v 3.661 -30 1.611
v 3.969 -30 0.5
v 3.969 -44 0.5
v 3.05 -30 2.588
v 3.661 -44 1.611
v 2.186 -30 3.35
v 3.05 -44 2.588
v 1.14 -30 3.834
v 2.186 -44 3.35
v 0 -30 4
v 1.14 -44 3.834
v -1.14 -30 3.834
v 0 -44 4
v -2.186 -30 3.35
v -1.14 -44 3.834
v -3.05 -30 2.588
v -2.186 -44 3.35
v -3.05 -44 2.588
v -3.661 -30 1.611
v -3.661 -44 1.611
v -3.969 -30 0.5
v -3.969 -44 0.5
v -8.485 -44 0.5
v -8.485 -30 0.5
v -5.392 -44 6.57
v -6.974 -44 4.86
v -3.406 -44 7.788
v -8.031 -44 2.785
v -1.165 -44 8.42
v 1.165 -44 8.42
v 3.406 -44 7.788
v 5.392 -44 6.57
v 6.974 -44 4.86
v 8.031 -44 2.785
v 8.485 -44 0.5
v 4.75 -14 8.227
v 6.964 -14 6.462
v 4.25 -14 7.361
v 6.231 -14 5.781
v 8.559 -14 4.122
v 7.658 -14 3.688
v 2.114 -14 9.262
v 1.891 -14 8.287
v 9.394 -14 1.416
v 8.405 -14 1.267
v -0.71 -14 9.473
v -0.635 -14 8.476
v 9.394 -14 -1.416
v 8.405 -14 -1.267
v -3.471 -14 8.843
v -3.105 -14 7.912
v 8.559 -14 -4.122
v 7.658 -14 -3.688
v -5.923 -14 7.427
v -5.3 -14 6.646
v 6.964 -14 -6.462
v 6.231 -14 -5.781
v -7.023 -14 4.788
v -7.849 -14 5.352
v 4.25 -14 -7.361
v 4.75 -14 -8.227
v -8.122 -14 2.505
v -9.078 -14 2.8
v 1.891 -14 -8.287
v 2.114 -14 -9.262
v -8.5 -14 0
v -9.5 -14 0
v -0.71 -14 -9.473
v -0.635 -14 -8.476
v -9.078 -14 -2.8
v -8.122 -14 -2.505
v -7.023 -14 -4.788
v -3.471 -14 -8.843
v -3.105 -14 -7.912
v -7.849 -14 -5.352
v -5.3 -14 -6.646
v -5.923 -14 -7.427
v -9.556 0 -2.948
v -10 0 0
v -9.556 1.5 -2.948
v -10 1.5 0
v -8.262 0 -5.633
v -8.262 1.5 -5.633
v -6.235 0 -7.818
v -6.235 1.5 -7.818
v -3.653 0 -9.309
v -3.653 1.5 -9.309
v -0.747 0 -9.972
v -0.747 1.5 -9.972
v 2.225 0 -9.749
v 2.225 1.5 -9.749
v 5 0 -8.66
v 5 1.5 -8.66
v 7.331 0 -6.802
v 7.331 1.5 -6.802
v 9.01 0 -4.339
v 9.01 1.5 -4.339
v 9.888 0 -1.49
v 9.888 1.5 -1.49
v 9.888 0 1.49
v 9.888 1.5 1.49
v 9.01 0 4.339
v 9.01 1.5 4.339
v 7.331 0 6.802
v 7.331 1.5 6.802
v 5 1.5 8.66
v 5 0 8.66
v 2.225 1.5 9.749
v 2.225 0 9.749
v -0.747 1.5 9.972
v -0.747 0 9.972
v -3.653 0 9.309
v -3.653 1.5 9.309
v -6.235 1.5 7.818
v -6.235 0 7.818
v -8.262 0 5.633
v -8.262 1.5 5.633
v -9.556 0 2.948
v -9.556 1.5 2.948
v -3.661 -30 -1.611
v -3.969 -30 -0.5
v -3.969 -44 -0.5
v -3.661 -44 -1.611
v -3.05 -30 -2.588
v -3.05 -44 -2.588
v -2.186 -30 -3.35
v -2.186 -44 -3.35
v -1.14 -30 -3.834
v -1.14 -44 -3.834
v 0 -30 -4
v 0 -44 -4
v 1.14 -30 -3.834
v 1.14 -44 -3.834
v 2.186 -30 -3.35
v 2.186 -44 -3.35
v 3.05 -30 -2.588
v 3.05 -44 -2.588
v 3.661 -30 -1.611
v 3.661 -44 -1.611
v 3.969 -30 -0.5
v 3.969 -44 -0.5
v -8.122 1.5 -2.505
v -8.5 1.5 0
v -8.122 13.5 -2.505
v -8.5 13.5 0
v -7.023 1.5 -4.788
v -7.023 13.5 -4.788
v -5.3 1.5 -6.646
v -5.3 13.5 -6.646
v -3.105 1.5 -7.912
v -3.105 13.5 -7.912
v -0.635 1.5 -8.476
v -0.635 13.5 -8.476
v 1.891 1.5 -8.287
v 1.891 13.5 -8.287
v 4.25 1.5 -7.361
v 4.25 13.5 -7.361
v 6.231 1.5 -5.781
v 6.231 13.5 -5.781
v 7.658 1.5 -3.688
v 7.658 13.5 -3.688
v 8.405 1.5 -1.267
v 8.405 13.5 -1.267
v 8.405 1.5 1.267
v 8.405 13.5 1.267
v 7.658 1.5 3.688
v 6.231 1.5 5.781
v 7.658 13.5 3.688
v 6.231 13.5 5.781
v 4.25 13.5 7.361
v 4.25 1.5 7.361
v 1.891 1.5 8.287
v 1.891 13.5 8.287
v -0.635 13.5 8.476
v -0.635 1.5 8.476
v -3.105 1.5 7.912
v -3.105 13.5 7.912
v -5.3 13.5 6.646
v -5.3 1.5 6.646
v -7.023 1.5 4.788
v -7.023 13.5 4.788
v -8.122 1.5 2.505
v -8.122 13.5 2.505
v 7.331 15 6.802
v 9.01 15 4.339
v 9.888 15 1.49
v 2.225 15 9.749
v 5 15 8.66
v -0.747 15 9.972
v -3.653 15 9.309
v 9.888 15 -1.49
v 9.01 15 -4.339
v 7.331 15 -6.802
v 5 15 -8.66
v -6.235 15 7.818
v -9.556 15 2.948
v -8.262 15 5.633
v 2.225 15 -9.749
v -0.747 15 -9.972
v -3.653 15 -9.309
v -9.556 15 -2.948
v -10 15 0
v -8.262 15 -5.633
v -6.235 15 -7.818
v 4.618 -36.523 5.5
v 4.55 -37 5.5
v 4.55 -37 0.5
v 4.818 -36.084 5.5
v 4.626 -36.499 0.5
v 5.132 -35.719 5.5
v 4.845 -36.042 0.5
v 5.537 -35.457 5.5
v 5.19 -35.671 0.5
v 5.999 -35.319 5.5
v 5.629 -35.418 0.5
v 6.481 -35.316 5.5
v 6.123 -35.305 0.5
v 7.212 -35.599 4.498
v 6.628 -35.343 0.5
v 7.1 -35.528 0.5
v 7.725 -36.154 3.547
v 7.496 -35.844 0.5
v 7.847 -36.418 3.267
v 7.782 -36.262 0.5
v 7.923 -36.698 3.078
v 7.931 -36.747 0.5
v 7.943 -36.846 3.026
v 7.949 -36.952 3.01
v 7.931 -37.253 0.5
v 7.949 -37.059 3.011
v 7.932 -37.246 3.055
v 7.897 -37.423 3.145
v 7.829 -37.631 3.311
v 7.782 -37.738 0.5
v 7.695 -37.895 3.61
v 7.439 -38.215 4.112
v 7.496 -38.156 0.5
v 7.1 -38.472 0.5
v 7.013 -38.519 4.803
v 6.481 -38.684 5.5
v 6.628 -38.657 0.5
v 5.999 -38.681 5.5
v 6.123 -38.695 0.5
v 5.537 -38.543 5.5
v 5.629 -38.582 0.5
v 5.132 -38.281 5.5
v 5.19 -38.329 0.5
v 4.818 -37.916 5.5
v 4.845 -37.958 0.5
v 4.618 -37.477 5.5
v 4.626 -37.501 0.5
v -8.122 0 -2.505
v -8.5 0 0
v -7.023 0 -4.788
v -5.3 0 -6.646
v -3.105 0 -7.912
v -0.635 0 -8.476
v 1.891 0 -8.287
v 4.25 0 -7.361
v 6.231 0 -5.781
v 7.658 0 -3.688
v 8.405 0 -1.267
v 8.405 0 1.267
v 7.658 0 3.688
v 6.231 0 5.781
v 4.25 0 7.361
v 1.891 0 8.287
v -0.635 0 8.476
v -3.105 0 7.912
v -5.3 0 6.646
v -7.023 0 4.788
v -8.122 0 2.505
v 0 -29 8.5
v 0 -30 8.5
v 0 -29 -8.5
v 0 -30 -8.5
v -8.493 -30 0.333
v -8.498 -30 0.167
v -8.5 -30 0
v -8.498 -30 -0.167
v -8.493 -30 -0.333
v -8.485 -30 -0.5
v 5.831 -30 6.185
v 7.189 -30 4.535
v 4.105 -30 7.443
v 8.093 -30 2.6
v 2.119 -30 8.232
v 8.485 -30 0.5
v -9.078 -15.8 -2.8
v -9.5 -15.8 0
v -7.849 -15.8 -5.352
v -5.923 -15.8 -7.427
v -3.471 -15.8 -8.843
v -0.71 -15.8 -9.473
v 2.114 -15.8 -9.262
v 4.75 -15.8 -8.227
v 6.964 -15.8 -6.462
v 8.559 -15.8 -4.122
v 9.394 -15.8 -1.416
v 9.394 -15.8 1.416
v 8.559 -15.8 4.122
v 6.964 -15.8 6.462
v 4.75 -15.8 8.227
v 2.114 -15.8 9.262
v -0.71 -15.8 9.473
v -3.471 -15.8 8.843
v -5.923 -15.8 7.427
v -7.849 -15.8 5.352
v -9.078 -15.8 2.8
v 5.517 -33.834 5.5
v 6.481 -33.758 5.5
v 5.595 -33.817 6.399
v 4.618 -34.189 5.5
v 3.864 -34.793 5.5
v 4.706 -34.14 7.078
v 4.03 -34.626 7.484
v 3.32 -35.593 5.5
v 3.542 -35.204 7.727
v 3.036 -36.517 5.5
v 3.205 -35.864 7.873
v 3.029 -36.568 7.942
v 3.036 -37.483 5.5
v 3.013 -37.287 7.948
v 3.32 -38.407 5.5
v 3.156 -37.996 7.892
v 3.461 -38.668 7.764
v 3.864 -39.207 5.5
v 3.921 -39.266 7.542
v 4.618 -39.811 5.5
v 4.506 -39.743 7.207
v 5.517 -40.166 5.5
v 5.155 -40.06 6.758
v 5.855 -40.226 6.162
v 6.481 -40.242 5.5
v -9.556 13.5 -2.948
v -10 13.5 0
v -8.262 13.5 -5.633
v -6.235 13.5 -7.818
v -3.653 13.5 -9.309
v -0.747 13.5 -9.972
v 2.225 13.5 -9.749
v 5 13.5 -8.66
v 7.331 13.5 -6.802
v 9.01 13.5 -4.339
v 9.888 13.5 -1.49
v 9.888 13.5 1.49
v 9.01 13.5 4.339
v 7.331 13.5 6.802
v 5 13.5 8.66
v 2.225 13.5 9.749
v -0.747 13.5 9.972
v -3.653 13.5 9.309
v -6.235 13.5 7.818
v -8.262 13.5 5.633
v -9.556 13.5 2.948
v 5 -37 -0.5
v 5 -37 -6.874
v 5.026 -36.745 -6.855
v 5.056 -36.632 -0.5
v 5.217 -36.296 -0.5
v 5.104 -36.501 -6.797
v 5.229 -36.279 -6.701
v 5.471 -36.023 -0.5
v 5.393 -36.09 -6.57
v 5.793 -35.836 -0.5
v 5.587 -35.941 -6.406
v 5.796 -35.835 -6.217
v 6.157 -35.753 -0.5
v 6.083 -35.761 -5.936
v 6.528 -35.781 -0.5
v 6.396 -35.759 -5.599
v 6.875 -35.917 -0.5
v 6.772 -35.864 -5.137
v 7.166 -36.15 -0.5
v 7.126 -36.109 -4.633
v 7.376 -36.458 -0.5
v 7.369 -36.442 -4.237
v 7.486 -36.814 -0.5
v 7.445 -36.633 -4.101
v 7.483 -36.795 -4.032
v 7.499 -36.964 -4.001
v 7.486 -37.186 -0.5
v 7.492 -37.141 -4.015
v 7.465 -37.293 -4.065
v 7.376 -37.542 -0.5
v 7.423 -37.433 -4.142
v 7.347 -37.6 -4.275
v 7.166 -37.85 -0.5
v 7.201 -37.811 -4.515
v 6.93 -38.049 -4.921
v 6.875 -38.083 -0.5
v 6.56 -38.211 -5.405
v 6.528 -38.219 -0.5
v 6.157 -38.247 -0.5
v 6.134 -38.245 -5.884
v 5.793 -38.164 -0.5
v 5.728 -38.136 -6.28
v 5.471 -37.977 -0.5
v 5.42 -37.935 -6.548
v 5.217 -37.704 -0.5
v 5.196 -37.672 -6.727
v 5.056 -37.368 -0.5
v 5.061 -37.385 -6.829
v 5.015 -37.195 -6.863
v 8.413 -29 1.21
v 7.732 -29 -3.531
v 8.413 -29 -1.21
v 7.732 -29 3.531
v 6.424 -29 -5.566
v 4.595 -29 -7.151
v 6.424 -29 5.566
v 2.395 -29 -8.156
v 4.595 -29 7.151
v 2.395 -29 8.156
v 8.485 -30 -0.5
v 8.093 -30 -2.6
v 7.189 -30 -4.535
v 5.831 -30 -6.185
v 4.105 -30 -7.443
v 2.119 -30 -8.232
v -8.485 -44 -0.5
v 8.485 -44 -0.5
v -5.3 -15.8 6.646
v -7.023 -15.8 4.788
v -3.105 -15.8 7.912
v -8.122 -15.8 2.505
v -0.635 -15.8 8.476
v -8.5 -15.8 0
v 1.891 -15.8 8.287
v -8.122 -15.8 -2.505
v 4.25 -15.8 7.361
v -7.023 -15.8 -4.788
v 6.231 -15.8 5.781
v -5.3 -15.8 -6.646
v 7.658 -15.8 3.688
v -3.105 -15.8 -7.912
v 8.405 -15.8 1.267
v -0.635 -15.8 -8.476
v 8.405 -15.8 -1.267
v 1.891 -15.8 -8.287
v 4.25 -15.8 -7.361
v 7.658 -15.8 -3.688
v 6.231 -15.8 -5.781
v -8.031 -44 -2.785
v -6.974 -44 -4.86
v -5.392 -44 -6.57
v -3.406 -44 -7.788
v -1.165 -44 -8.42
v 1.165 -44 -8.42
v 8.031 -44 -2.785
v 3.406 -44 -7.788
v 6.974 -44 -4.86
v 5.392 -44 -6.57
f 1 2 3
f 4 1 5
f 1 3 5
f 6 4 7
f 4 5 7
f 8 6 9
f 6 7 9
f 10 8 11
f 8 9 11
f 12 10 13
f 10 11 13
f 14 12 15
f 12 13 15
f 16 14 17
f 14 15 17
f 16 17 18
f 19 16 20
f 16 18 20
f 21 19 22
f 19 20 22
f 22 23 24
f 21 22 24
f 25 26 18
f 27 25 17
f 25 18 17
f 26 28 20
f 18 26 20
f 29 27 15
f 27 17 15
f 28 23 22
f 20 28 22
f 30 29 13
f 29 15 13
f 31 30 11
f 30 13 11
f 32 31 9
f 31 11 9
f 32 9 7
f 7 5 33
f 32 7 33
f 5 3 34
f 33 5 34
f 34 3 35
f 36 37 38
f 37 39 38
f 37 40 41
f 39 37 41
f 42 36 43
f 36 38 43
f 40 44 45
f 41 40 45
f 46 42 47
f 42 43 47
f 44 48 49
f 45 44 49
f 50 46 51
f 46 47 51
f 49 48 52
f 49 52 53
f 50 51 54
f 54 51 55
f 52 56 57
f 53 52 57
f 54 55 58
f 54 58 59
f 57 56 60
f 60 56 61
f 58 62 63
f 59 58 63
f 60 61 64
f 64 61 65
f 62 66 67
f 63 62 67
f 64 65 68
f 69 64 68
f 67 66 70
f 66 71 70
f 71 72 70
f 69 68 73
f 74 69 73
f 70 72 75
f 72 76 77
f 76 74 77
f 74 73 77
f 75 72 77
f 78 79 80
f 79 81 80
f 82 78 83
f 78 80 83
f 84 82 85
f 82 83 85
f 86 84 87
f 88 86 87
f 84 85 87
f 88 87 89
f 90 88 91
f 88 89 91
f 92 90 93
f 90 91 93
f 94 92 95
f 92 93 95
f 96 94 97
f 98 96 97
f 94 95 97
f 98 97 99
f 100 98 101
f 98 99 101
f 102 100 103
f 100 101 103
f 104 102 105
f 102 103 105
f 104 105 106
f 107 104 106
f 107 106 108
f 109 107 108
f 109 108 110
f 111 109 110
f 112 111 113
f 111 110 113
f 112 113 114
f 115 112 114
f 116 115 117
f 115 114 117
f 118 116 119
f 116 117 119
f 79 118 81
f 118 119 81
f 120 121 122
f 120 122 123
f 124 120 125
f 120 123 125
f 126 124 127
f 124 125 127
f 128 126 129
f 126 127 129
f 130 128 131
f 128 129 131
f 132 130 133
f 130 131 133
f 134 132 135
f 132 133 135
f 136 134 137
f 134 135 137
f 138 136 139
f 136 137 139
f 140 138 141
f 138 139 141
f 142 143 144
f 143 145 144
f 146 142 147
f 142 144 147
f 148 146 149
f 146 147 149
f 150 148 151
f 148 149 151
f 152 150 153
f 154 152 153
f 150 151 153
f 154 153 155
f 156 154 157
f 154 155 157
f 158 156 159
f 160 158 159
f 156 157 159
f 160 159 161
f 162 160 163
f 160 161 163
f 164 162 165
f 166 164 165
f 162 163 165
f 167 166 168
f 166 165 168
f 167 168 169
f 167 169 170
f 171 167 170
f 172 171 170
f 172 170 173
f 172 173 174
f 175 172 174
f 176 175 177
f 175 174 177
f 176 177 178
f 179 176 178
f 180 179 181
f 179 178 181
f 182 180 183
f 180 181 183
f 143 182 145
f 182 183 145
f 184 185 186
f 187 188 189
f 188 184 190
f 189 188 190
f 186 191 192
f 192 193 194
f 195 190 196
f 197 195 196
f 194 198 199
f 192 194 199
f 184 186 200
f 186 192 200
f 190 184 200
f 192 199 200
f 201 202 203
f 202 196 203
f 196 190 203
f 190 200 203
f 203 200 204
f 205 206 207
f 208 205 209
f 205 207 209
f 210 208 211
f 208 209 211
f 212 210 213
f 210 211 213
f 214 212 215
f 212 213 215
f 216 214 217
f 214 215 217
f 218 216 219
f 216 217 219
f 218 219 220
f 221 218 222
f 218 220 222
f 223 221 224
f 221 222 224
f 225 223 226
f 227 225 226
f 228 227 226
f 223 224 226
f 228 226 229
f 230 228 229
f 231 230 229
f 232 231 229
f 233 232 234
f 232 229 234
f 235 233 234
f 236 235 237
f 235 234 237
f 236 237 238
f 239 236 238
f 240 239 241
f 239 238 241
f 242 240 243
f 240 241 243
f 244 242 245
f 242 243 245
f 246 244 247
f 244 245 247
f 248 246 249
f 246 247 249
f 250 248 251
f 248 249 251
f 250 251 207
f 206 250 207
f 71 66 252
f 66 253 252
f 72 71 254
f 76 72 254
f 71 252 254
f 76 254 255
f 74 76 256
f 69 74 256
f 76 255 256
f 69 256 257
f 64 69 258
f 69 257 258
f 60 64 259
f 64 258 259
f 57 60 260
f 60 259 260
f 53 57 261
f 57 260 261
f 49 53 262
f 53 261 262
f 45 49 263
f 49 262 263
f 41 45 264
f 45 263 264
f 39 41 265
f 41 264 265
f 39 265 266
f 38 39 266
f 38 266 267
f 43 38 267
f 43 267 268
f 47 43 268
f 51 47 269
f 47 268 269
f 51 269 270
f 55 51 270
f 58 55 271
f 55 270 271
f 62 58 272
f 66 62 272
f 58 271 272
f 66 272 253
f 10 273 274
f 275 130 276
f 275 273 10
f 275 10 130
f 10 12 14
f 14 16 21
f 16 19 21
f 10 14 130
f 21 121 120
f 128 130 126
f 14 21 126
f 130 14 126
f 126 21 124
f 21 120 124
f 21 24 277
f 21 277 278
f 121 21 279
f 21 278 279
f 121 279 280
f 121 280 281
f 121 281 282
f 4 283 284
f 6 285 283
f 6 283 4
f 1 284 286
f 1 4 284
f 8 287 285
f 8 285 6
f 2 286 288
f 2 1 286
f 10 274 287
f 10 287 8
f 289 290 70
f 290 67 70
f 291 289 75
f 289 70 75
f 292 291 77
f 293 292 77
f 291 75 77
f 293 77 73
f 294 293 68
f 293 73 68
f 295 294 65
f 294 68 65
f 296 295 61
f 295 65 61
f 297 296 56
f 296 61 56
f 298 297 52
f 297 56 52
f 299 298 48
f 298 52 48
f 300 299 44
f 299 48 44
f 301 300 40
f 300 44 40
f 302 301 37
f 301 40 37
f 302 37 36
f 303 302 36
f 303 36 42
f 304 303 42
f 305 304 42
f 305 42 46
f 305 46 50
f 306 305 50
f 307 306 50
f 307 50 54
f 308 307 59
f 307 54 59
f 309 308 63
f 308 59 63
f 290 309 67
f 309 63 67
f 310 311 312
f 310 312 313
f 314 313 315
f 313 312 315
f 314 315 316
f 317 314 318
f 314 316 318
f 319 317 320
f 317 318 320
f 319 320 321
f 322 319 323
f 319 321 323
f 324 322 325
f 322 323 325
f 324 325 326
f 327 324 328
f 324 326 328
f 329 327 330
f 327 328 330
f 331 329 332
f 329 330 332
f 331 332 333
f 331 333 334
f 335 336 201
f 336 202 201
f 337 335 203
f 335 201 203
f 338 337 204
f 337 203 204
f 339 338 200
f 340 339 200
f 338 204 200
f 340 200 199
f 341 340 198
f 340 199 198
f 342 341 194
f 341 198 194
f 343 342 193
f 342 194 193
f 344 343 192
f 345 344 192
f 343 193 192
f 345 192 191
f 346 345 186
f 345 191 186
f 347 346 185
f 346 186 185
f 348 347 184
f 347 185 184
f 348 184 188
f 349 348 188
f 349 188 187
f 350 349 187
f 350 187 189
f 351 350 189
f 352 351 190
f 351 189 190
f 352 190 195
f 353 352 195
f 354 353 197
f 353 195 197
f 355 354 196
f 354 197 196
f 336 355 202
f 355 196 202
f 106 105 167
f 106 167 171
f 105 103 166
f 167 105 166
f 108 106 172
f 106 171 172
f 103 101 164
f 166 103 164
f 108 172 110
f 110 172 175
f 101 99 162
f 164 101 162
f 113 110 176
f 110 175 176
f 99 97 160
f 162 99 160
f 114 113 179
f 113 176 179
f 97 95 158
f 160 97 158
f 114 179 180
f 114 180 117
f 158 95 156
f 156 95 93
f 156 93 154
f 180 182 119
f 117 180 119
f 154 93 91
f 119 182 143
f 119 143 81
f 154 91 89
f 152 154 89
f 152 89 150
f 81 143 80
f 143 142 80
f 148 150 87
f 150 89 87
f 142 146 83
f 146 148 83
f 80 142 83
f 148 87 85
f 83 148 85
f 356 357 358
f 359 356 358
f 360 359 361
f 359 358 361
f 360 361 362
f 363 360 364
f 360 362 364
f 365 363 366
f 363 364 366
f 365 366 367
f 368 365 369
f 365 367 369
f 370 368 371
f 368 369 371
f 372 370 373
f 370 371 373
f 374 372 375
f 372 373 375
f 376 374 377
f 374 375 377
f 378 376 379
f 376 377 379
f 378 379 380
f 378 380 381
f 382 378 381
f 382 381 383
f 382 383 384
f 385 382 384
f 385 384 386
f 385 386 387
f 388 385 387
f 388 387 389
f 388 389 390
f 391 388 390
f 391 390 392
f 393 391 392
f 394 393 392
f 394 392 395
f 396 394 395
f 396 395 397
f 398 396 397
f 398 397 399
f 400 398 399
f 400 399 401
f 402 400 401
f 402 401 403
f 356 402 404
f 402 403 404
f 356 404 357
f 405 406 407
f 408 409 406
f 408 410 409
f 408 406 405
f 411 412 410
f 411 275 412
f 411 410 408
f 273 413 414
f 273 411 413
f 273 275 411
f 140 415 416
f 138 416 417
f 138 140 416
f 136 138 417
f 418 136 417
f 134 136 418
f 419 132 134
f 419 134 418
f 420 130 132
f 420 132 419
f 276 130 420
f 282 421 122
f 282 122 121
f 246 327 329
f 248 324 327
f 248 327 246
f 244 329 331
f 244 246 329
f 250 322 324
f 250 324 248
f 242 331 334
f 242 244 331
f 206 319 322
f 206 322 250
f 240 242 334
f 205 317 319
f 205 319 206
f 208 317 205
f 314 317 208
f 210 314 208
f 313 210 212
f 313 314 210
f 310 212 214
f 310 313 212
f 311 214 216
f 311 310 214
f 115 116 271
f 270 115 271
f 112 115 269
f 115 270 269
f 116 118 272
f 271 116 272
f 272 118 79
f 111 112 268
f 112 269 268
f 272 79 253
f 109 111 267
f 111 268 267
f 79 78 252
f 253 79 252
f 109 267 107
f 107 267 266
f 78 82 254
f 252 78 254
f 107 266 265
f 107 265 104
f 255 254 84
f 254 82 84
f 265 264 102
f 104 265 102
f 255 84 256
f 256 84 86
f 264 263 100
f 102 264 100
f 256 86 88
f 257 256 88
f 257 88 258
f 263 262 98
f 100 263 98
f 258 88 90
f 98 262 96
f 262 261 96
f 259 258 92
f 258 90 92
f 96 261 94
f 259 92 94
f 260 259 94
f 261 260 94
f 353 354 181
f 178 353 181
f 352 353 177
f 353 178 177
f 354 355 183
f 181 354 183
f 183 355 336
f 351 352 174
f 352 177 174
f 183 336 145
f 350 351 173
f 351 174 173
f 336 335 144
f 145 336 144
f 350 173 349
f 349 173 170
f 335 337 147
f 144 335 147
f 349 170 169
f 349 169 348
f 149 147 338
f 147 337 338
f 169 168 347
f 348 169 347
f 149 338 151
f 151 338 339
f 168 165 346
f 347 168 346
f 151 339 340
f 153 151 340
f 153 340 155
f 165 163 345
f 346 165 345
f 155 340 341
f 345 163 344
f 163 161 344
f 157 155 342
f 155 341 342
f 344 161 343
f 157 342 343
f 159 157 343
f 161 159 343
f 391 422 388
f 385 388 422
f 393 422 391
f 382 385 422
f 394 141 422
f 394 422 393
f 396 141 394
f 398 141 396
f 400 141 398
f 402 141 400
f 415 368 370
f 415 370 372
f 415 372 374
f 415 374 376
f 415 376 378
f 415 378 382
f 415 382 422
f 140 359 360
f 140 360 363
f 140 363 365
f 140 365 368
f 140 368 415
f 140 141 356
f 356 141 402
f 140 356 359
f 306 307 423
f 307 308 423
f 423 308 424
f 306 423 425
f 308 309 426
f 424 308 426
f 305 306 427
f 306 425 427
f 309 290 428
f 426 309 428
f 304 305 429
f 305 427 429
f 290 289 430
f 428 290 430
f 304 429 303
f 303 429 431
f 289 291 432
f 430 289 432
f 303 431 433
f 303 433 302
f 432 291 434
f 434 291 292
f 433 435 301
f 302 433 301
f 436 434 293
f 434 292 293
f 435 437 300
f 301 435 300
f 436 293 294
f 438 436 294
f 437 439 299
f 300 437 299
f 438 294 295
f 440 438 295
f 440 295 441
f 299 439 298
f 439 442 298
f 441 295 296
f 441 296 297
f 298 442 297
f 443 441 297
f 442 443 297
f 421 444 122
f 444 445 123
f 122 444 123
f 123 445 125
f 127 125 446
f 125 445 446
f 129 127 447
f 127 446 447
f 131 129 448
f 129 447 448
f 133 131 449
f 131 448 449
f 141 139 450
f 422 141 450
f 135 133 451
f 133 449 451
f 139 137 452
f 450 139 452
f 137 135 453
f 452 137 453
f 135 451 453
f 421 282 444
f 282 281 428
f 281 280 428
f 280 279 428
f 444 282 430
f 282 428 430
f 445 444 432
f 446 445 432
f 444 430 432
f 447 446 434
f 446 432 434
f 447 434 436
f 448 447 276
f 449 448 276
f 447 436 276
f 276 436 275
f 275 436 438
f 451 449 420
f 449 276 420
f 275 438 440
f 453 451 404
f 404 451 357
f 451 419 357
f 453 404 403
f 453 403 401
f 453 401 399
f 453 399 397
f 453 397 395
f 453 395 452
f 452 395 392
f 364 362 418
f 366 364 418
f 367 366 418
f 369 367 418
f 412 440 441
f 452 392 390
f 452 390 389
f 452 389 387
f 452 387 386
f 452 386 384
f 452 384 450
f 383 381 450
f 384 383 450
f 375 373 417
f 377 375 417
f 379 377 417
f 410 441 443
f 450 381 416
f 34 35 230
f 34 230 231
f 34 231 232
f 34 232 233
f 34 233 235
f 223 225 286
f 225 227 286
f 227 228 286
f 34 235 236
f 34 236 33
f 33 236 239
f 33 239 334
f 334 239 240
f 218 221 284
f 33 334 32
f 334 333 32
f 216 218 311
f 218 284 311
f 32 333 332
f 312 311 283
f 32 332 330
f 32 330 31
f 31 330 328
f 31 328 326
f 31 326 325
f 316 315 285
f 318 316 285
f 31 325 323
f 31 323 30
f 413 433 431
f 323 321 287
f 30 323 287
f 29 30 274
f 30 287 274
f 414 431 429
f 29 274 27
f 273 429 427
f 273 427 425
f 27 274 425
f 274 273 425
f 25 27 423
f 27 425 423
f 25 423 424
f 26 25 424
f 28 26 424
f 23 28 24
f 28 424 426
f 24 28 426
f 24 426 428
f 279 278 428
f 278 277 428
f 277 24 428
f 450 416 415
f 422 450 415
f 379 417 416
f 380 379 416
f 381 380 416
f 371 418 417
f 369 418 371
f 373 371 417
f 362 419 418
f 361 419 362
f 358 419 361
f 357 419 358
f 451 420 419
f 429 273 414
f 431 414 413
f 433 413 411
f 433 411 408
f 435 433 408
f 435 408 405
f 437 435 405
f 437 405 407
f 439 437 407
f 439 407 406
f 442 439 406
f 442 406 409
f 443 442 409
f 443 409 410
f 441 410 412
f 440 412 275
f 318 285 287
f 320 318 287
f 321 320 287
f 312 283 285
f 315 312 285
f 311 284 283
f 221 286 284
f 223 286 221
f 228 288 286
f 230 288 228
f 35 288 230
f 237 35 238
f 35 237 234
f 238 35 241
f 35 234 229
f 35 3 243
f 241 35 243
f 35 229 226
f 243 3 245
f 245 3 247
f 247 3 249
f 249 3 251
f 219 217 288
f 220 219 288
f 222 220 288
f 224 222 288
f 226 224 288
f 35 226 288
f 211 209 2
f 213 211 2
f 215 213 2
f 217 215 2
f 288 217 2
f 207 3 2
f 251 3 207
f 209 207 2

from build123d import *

# Parameters (mm, degrees)
CBORE_FOR_M3_SHCS1_D           = 3.4
CBORE_FOR_M3_SHCS1_DEPTH       = 8.5
CBORE_FOR_M3_SHCS1_CBORE_D     = 6.5
CBORE_FOR_M3_SHCS1_CBORE_DEPTH = 3
M3X0_5_TAPPED_HOLE1_D          = 2.5
CUT_EXTRUDE1_DEPTH             = 47.216880128
CUT_EXTRUDE1_DEPTH_BACK        = 47.216880128
SKETCH10_W                     = 1
SKETCH10_H                     = 15
CUT_EXTRUDE2_DEPTH             = 10


with BuildPart() as part:
    # Sketch1 → Revolve1 (revolve)
    with BuildSketch(Plane.XY):
        Polygon((-8.5, -44), (-8.5, -15.8), (-9.5, -15.8), (-9.5, -14), (-8.5, -14), (-8.5, 0), (-10, 0), (-10, 1.5), (-8.5, 1.5), (-8.5, 13.5), (-10, 13.5), (-10, 15), (0, 15), (0, -30), (-4, -30), (-4, -44), align=None)
    revolve(axis=Axis((0, 15, 0), (0, -1, 0)))

    # CBORE for M3 SHCS1
    with Locations(Plane.XY.offset(8.5)):
        with Locations((6.25, -37)):
            CounterBoreHole(CBORE_FOR_M3_SHCS1_D / 2, CBORE_FOR_M3_SHCS1_CBORE_D / 2, CBORE_FOR_M3_SHCS1_CBORE_DEPTH, depth=CBORE_FOR_M3_SHCS1_DEPTH)

    # M3x0.5 Tapped Hole1 (through all)
    with Locations(Plane.XY):
        with Locations((6.25, -37)):
            Hole(M3X0_5_TAPPED_HOLE1_D / 2)

    # Sketch10 → Cut-Extrude1 (cut, two sides: drawn at the far end of the back side and taken through both)
    with BuildSketch(Plane(origin=(0, 0, 0), x_dir=(0, 0, -1), z_dir=(1, 0, 0)).offset(-CUT_EXTRUDE1_DEPTH_BACK)):
        with Locations((0, -37.5)):
            Rectangle(SKETCH10_W, SKETCH10_H)
    extrude(amount=CUT_EXTRUDE1_DEPTH + CUT_EXTRUDE1_DEPTH_BACK, mode=Mode.SUBTRACT)

    # Sketch10<3> → Cut-Extrude2 (cut)
    with BuildSketch(Plane(origin=(0, 0, 0), x_dir=(0, 0, -1), z_dir=(1, 0, 0))):
        Polygon((-0.5, -30), (0.5, -30), (9.5, -30), (9.5, -29), (-9.5, -29), (-9.5, -30), align=None)
    extrude(amount=CUT_EXTRUDE2_DEPTH, mode=Mode.SUBTRACT)


solid = part.part
